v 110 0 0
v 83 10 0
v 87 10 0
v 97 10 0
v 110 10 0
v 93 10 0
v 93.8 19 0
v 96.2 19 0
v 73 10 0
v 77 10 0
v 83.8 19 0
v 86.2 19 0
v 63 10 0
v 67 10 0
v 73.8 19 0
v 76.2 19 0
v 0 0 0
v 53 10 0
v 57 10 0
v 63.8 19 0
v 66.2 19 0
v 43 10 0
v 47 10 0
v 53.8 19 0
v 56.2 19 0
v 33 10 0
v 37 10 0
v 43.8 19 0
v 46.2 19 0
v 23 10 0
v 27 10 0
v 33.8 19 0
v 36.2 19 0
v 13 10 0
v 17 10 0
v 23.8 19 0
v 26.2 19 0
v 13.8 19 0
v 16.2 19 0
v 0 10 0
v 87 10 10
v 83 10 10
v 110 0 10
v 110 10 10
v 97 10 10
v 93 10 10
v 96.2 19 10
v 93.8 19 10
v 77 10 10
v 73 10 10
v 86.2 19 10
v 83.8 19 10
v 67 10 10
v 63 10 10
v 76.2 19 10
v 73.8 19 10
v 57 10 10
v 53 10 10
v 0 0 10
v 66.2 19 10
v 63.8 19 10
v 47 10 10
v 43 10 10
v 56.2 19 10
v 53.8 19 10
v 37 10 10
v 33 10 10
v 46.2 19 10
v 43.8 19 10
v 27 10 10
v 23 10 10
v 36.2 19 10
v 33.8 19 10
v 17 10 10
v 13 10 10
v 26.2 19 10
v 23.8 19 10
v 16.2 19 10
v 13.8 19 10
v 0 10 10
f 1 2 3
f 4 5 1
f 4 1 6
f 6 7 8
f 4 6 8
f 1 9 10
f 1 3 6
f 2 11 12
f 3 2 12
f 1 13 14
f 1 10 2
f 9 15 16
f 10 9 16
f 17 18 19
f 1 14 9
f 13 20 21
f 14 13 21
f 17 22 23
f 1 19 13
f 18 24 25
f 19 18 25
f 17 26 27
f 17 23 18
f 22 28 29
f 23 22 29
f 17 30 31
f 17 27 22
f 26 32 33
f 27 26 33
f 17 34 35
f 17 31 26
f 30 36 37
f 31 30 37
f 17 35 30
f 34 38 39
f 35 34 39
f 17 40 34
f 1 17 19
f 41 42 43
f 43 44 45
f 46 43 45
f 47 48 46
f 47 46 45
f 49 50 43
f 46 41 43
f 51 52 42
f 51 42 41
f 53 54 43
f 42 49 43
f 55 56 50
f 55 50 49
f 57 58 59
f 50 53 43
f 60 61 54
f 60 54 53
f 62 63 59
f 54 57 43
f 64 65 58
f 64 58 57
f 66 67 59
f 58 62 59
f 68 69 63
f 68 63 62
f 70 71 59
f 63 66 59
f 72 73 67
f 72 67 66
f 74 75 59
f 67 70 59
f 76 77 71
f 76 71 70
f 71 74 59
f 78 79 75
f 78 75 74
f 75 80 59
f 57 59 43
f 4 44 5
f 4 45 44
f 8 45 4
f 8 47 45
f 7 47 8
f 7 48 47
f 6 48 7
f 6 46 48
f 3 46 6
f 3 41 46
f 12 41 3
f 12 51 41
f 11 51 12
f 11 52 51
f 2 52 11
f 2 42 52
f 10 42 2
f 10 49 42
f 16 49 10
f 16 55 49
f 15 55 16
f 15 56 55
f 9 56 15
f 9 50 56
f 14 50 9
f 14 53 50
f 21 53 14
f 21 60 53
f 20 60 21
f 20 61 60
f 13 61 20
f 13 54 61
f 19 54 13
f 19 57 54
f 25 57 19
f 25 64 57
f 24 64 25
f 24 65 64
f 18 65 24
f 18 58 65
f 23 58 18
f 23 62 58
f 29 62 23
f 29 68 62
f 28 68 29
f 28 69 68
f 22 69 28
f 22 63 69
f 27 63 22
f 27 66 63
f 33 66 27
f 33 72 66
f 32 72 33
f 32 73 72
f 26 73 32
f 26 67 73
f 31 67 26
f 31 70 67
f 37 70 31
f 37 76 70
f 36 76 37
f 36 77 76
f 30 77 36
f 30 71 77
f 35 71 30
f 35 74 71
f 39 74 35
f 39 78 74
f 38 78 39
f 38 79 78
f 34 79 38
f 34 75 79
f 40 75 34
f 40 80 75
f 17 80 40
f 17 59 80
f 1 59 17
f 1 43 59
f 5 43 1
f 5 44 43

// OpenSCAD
$fn = 32;

// ----------------------------------------------------------------------
// Gear rack: 9 teeth on a 110 mm bar, pitch 10 mm
// ----------------------------------------------------------------------

// --- parameters (mm) ---
profile_height = 10;      // extrusion height
profile_points = 40;      // points of the closed outline

profile = [[0, 0], [110, 0], [110, 10], [97, 10], [96.2, 19], [93.8, 19], [93, 10], [87, 10], [86.2, 19], [83.8, 19], [83, 10], [77, 10], [76.2, 19], [73.8, 19], [73, 10], [67, 10], [66.2, 19], [63.8, 19], [63, 10], [57, 10], [56.2, 19], [53.8, 19], [53, 10], [47, 10], [46.2, 19], [43.8, 19], [43, 10], [37, 10], [36.2, 19], [33.8, 19], [33, 10], [27, 10], [26.2, 19], [23.8, 19], [23, 10], [17, 10], [16.2, 19], [13.8, 19], [13, 10], [0, 10]];  // single closed polygon, 40 points, counter clockwise

// --- the one profile operation ---
linear_extrude(height = profile_height) polygon(points = profile);
